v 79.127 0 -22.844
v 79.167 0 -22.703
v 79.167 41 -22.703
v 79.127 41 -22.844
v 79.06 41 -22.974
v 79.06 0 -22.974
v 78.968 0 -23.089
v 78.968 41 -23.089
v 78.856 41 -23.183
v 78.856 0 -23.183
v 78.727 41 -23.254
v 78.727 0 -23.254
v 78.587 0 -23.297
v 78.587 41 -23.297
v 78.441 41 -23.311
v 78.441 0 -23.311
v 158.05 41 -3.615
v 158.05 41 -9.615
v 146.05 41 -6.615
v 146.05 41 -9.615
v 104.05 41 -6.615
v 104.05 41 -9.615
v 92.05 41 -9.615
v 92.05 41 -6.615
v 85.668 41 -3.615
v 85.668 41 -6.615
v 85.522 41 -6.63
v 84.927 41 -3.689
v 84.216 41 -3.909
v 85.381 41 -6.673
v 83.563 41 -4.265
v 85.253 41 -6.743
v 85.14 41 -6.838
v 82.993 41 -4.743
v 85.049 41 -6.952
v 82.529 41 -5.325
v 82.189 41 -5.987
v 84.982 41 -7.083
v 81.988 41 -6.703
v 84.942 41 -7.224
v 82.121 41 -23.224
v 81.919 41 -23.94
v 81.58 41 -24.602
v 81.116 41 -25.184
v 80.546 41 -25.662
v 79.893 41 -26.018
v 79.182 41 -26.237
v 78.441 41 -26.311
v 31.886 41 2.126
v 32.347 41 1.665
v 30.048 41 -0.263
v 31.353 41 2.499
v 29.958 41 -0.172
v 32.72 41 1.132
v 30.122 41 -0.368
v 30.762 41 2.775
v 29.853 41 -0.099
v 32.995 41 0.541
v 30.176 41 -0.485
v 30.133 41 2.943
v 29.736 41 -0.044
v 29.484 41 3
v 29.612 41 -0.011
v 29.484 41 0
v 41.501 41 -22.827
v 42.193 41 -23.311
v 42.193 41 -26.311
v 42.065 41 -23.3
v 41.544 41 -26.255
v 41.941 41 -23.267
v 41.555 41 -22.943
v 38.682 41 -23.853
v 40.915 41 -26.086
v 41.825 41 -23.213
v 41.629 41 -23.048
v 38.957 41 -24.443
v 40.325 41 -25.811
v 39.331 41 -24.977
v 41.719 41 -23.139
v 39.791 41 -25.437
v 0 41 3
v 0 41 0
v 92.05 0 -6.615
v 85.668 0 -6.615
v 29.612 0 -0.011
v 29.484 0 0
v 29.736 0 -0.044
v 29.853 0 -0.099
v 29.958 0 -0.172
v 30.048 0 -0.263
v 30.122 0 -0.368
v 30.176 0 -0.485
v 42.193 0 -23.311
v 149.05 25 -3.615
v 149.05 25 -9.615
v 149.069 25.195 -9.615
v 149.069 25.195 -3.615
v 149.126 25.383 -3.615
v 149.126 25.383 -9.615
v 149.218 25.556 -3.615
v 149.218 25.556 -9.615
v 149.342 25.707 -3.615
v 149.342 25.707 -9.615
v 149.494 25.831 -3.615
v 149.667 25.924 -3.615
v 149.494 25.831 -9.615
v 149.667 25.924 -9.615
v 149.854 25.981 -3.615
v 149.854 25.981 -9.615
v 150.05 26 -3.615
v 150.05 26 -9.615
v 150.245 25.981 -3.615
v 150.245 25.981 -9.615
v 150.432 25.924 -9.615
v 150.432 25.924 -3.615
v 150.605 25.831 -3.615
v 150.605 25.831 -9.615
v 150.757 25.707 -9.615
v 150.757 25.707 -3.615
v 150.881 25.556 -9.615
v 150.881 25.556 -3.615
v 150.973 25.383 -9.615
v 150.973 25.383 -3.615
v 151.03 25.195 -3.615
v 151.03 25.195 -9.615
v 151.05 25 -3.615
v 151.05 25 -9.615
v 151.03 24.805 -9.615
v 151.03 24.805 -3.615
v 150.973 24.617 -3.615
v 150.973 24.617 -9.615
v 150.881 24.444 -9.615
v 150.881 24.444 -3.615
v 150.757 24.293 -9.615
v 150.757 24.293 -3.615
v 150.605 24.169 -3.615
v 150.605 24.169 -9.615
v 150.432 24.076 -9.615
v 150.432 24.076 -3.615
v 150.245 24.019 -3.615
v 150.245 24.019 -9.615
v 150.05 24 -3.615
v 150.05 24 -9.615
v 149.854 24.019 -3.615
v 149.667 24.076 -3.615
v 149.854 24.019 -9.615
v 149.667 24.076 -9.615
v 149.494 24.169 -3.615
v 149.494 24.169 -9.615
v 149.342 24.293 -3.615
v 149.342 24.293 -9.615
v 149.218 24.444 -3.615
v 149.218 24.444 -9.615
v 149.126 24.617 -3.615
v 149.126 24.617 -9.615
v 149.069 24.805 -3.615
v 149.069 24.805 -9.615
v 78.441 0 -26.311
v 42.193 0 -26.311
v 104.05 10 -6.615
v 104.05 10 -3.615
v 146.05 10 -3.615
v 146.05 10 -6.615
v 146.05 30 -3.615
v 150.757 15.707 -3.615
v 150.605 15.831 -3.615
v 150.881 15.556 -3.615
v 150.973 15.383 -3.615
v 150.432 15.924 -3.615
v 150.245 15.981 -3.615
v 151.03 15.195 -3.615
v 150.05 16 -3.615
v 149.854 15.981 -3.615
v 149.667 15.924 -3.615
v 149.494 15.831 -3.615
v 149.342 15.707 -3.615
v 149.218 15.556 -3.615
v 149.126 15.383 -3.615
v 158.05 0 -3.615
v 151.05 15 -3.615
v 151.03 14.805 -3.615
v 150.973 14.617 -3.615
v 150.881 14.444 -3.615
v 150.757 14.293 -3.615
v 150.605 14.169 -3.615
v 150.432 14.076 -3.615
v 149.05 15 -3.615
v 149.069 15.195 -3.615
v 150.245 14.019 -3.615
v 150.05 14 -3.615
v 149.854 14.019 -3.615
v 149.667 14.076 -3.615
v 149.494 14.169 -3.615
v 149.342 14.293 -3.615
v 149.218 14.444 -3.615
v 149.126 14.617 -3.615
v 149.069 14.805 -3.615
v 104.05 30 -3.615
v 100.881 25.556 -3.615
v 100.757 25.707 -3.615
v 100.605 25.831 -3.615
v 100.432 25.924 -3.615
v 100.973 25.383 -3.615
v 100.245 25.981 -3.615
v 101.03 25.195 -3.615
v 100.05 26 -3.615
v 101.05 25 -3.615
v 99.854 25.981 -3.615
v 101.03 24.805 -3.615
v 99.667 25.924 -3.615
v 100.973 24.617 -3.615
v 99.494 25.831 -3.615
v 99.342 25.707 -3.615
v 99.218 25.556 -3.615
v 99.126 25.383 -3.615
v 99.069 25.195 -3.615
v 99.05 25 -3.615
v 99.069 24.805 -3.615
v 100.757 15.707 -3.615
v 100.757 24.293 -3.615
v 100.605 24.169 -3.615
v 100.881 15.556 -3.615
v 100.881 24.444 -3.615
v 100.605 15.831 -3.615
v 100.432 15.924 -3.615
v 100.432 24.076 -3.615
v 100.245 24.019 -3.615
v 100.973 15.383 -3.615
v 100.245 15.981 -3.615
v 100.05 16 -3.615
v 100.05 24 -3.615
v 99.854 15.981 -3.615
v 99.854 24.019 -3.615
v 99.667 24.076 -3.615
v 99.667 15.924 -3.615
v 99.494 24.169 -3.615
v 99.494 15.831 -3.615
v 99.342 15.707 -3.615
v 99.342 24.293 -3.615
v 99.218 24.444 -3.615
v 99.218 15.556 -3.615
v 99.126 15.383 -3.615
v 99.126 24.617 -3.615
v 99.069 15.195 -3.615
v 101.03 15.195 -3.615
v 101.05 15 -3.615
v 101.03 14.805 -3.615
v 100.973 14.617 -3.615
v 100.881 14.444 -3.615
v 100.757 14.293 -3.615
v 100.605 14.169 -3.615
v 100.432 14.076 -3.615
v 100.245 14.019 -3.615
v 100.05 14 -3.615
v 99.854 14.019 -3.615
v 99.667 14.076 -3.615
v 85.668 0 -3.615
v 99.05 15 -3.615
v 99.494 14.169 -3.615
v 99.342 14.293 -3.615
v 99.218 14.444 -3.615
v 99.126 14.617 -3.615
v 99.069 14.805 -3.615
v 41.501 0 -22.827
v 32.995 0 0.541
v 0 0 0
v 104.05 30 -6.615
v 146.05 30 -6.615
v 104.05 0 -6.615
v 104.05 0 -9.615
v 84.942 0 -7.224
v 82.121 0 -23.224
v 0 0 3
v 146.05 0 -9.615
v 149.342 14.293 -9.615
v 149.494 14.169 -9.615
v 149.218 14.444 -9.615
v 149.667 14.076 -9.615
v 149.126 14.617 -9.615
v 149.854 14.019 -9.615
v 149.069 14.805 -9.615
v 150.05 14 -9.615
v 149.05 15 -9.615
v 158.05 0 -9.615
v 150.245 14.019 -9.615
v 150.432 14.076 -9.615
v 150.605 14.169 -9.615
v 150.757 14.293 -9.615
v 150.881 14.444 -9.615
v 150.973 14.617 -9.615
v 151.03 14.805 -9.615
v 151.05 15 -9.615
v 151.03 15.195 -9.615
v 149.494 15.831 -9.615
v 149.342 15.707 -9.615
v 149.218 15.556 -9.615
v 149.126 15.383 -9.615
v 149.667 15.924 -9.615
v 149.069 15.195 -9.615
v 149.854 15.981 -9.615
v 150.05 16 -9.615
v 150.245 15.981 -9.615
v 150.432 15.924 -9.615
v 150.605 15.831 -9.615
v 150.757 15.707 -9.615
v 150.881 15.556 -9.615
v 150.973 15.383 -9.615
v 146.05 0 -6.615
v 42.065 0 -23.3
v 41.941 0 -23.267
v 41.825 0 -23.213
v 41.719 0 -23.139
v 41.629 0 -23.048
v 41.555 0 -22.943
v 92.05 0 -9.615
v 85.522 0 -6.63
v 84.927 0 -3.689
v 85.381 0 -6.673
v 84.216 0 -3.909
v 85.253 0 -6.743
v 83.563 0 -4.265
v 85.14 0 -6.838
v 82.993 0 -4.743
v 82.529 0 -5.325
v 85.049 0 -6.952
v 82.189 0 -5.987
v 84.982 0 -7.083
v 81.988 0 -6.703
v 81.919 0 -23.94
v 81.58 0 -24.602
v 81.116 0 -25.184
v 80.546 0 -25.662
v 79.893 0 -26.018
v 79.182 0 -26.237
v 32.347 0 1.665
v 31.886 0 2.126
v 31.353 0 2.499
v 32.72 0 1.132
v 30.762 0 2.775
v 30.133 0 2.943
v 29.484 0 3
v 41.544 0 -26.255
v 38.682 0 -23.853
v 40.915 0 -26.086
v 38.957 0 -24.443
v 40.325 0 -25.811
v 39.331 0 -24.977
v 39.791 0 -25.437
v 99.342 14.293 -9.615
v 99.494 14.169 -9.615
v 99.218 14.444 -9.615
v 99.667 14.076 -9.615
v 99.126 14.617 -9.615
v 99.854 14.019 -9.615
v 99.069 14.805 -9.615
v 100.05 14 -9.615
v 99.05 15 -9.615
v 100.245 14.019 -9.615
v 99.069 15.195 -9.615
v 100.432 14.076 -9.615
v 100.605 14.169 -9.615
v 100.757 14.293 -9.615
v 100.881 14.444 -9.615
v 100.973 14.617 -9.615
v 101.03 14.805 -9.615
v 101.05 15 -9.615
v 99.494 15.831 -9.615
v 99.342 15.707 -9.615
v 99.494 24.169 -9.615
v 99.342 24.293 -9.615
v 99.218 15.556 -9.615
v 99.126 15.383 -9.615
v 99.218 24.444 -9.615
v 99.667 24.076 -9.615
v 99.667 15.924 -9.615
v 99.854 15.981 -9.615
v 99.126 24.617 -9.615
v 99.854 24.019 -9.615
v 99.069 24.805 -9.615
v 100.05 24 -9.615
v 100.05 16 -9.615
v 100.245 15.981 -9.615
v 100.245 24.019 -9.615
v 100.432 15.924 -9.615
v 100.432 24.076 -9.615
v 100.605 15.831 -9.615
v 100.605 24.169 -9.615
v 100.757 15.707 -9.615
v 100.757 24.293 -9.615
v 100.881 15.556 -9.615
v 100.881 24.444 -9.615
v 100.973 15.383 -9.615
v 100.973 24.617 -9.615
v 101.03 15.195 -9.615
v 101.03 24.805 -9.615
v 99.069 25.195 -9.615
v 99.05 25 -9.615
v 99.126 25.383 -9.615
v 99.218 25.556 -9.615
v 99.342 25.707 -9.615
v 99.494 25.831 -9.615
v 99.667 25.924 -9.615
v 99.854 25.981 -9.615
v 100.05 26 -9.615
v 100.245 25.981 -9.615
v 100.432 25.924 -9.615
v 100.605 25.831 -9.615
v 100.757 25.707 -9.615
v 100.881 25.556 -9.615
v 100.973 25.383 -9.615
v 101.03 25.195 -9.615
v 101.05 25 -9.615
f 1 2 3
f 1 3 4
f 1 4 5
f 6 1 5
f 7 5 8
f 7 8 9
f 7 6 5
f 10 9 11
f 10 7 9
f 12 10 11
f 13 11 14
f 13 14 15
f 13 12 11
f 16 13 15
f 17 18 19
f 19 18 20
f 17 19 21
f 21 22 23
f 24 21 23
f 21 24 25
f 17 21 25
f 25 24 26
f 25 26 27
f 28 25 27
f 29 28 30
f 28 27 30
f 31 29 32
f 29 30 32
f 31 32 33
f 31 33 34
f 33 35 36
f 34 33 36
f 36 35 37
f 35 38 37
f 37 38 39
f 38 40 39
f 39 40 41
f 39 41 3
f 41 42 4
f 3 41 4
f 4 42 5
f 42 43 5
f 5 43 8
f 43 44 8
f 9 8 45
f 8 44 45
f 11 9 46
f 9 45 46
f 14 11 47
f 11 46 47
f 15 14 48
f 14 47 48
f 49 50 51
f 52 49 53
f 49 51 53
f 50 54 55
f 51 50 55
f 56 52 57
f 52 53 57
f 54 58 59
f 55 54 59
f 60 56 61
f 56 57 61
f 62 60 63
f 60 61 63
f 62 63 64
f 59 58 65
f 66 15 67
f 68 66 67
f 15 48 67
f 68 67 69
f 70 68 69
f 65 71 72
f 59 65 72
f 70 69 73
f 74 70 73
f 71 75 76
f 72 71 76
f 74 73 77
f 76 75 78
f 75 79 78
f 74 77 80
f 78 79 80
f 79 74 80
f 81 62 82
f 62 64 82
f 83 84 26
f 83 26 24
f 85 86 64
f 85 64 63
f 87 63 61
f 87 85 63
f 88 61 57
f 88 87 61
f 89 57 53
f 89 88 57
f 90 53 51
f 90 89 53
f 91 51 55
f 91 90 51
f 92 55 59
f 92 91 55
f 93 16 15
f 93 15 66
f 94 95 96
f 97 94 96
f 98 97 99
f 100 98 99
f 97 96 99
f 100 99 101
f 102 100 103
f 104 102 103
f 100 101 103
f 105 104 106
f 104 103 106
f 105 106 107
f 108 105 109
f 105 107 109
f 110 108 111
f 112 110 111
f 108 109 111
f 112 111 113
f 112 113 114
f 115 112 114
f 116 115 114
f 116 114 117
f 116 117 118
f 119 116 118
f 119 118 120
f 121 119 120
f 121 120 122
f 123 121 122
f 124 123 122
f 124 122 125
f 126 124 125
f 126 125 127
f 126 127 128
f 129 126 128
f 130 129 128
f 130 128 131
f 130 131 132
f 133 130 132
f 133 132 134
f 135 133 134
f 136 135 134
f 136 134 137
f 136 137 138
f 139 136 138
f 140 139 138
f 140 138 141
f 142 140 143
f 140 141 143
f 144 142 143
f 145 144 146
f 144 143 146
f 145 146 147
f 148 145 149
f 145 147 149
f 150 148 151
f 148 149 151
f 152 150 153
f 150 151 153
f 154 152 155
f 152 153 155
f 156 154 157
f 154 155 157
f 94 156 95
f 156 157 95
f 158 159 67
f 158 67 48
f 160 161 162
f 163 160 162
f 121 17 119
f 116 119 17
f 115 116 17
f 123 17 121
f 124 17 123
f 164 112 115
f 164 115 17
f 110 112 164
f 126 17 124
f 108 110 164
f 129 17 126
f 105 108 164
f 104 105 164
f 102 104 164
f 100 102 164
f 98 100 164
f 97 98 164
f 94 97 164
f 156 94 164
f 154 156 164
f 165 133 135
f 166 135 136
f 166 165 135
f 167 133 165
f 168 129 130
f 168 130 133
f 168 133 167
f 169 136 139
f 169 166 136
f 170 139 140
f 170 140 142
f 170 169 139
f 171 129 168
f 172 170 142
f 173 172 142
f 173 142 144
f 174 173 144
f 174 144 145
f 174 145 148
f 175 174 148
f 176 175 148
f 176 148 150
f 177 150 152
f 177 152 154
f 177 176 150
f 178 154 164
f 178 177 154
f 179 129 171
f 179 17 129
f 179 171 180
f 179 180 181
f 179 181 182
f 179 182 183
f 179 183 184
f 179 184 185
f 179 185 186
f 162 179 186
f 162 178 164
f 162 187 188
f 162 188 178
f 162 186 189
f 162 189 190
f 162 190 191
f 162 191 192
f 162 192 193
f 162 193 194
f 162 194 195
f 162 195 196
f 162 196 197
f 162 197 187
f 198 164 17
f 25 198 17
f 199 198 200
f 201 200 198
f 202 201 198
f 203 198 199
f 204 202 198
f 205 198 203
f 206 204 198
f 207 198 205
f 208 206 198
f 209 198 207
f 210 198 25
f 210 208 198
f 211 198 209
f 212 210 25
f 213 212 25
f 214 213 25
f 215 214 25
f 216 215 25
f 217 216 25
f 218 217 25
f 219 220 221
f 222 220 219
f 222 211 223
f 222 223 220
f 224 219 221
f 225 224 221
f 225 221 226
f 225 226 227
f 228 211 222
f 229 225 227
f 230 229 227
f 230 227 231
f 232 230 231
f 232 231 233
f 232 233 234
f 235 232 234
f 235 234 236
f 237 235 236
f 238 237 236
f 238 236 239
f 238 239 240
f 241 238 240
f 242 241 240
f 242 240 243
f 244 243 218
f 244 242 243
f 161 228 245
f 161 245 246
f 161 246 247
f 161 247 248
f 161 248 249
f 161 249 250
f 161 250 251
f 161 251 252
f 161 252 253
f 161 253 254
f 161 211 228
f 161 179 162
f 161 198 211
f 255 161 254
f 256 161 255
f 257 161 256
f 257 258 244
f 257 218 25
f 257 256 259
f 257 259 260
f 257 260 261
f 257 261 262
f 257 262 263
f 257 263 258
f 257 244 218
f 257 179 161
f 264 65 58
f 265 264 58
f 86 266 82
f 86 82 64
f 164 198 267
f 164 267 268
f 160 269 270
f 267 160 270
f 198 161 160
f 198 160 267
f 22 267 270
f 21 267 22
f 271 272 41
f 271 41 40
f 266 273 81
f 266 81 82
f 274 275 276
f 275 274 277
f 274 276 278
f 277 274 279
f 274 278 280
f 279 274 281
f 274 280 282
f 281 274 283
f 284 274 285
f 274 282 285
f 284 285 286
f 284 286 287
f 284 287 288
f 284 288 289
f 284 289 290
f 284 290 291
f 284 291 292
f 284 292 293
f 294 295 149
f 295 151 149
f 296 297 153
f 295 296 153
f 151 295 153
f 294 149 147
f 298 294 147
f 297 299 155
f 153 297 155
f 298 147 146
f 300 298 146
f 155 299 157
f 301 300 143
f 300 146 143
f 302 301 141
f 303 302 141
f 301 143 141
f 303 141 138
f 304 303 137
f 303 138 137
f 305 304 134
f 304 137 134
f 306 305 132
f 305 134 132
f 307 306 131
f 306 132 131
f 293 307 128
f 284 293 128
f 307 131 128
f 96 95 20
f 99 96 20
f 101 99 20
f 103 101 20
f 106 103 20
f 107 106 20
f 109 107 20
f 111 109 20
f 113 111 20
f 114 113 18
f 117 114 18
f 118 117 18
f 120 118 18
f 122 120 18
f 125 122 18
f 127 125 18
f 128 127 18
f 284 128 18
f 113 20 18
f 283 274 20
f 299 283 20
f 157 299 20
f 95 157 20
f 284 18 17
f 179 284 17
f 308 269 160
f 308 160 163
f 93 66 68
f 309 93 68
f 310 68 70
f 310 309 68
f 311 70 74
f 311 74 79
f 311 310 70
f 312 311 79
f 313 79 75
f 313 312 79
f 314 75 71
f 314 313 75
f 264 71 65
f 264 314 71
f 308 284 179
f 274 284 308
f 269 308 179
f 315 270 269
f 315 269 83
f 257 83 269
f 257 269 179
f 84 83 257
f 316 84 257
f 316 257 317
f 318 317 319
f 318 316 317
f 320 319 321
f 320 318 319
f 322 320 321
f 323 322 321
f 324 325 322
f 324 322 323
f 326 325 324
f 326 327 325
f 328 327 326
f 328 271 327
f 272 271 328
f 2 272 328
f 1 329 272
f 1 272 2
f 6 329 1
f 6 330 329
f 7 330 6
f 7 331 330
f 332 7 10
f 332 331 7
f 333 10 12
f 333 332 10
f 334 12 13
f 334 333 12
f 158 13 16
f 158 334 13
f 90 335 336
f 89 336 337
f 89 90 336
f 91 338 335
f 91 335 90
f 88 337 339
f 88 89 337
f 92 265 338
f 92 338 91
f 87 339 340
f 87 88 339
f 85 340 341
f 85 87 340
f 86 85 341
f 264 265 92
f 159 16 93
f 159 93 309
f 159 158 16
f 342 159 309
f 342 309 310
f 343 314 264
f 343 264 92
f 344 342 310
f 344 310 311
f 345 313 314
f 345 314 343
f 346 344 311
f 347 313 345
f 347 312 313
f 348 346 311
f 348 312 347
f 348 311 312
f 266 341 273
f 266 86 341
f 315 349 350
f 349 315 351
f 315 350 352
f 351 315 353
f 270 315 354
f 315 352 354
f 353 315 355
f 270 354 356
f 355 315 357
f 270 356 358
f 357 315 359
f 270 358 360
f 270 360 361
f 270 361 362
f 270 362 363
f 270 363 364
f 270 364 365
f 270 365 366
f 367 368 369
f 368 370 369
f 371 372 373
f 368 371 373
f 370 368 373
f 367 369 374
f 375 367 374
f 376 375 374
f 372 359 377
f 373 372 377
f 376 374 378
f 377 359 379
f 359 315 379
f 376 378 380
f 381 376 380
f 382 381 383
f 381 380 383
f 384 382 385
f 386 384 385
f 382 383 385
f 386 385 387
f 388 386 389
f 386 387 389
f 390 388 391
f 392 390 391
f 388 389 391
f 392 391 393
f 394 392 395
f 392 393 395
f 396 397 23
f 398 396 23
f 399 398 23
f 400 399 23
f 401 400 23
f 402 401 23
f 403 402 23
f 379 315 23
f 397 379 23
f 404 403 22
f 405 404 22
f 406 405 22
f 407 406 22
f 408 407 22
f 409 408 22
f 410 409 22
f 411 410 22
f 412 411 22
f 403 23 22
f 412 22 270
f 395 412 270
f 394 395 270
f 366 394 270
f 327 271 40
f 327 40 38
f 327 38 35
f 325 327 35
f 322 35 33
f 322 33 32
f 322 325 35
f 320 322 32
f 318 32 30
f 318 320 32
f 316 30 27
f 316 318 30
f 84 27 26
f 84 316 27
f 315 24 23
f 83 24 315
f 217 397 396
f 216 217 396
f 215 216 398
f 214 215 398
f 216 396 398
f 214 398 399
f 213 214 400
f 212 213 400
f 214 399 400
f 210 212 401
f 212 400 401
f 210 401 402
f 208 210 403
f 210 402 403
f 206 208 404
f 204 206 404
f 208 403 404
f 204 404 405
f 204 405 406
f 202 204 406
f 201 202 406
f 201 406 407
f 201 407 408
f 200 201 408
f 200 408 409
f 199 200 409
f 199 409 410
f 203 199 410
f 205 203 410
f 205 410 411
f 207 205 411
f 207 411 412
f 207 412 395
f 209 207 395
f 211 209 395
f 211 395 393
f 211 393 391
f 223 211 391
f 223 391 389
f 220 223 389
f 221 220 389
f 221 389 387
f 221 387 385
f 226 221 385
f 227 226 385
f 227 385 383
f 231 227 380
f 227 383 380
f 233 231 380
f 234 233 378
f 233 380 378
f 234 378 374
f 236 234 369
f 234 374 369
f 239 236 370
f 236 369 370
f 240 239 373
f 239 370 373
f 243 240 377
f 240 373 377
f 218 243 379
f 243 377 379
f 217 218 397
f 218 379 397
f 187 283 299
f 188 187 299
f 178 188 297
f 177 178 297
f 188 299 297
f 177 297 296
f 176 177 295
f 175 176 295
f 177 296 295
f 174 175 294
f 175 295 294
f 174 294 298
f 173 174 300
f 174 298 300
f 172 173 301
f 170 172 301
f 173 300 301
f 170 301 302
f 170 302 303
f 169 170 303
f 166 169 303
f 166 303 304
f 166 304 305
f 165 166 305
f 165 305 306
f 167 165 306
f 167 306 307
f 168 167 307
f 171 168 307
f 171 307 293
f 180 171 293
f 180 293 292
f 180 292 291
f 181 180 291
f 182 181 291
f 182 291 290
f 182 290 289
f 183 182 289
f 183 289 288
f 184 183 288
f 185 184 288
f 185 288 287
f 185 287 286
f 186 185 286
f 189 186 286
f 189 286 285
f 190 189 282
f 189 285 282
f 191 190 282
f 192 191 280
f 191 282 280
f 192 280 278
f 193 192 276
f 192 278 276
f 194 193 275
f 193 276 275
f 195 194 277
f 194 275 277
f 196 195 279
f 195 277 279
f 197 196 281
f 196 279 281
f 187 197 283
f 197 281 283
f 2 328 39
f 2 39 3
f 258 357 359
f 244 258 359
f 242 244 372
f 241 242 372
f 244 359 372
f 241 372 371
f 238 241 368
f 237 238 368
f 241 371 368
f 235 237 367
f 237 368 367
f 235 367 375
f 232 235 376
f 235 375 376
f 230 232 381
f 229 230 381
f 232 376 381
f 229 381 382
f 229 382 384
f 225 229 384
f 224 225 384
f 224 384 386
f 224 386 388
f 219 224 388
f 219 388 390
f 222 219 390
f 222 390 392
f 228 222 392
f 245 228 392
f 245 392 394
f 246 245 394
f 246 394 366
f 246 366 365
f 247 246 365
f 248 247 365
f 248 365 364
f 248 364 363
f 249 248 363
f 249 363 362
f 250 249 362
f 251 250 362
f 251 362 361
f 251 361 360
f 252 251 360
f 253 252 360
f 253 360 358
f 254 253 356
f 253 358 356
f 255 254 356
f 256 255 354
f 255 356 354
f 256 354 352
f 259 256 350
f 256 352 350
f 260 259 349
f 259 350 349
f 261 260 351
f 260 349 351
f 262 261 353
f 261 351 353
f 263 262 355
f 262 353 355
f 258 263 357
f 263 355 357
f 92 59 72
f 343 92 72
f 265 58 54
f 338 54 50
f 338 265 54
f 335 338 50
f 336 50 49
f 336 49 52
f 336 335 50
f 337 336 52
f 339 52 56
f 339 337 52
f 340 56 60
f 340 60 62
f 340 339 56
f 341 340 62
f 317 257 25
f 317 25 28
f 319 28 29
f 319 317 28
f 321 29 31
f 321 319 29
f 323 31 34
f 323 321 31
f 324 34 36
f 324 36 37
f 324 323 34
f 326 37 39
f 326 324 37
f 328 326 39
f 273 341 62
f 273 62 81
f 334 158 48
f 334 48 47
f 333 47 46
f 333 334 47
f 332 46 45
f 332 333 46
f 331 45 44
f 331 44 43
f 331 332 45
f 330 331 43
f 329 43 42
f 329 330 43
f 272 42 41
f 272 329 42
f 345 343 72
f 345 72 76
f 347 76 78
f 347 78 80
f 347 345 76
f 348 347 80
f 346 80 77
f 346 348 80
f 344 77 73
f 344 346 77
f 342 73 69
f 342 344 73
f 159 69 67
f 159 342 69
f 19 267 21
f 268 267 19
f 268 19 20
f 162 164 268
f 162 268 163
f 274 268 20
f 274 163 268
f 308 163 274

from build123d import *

# Parameters (mm, degrees)
BASE_FLANGE1_DEPTH  = 41
SKETCH2_W           = 42
SKETCH2_H           = 20
CUT_EXTRUDE1_DEPTH  = 10
BOSS_EXTRUDE1_DEPTH = 6
SKETCH5_R           = 1
CUT_EXTRUDE3_DEPTH  = 165.132308696


# Sheet-metal steps are written as plain solids
with BuildPart() as part:
    # Sketch1 → Base-Flange1 (new body)
    with BuildSketch(Plane(origin=(0, 0, 0), x_dir=(1, 0, 0), z_dir=(0, 1, 0))):
        with BuildLine():
            Line((0, 0), (29.484227127, 0))
            ThreePointArc((29.484227127, 0), (29.90672353, 0.133212604), (30.176404712, 0.484667962))
            Line((30.176404712, 0.484667962), (38.681704054, 23.85278585))
            ThreePointArc((38.681704054, 23.85278585), (40.049733788, 25.635636911), (42.1929595, 26.311393382))
            Line((42.1929595, 26.311393382), (78.441184331, 26.311393382))
            ThreePointArc((78.441184331, 26.311393382), (80.843024514, 25.437195048), (82.121016981, 23.223647163))
            Line((82.121016981, 23.223647163), (84.942198964, 7.223929074))
            ThreePointArc((84.942198964, 7.223929074), (85.194131001, 6.787569985), (85.667608355, 6.615238322))
            Line((85.667608355, 6.615238322), (158.049527566, 6.615238322))
            Line((158.049527566, 6.615238322), (158.049527566, 3.615238322))
            Line((158.049527566, 3.615238322), (85.667608355, 3.615238322))
            ThreePointArc((85.667608355, 3.615238322), (83.265768172, 4.489436656), (81.987775705, 6.702984541))
            Line((81.987775705, 6.702984541), (79.166593722, 22.70270263))
            ThreePointArc((79.166593722, 22.70270263), (78.914661685, 23.139061719), (78.441184331, 23.311393382))
            Line((78.441184331, 23.311393382), (42.1929595, 23.311393382))
            ThreePointArc((42.1929595, 23.311393382), (41.770463097, 23.178180778), (41.500781916, 22.82672542))
            Line((41.500781916, 22.82672542), (32.995482574, -0.541392468))
            ThreePointArc((32.995482574, -0.541392468), (31.627452839, -2.324243529), (29.484227127, -3))
            Line((29.484227127, -3), (0, -3))
            Line((0, -3), (0, 0))
        make_face()
    extrude(amount=BASE_FLANGE1_DEPTH)

    # Sketch2 → Cut-Extrude1 (cut)
    with BuildSketch(Plane.XY.offset(-3.615238322)):
        with Locations((125.049527566, 20)):
            Rectangle(SKETCH2_W, SKETCH2_H)
    extrude(amount=-CUT_EXTRUDE1_DEPTH, mode=Mode.SUBTRACT)

    # Sketch3 → Boss-Extrude1 (add)
    with BuildSketch(Plane.XY.offset(-3.615238322)):
        Polygon((104.049527566, 30), (104.049527566, 41), (92.049527566, 41), (92.049527566, 0), (104.049527566, 0), (104.049527566, 10), align=None)
        Polygon((158.049527566, 0), (158.049527566, 41), (146.049527566, 41), (146.049527566, 30), (146.049527566, 10), (146.049527566, 0), align=None)
    extrude(amount=-BOSS_EXTRUDE1_DEPTH)

    # Sketch5 → Cut-Extrude3 (cut, through all)
    with BuildSketch(Plane(origin=(0, 0, -9.615238322), x_dir=(-1, 0, 0), z_dir=(0, 0, -1))):
        with Locations((-100.049527566, 25)):
            Circle(SKETCH5_R)
        with Locations((-100.049527566, 15)):
            Circle(SKETCH5_R)
        with Locations((-150.049527566, 15)):
            Circle(SKETCH5_R)
        with Locations((-150.049527566, 25)):
            Circle(SKETCH5_R)
    extrude(amount=-CUT_EXTRUDE3_DEPTH, mode=Mode.SUBTRACT)


solid = part.part
